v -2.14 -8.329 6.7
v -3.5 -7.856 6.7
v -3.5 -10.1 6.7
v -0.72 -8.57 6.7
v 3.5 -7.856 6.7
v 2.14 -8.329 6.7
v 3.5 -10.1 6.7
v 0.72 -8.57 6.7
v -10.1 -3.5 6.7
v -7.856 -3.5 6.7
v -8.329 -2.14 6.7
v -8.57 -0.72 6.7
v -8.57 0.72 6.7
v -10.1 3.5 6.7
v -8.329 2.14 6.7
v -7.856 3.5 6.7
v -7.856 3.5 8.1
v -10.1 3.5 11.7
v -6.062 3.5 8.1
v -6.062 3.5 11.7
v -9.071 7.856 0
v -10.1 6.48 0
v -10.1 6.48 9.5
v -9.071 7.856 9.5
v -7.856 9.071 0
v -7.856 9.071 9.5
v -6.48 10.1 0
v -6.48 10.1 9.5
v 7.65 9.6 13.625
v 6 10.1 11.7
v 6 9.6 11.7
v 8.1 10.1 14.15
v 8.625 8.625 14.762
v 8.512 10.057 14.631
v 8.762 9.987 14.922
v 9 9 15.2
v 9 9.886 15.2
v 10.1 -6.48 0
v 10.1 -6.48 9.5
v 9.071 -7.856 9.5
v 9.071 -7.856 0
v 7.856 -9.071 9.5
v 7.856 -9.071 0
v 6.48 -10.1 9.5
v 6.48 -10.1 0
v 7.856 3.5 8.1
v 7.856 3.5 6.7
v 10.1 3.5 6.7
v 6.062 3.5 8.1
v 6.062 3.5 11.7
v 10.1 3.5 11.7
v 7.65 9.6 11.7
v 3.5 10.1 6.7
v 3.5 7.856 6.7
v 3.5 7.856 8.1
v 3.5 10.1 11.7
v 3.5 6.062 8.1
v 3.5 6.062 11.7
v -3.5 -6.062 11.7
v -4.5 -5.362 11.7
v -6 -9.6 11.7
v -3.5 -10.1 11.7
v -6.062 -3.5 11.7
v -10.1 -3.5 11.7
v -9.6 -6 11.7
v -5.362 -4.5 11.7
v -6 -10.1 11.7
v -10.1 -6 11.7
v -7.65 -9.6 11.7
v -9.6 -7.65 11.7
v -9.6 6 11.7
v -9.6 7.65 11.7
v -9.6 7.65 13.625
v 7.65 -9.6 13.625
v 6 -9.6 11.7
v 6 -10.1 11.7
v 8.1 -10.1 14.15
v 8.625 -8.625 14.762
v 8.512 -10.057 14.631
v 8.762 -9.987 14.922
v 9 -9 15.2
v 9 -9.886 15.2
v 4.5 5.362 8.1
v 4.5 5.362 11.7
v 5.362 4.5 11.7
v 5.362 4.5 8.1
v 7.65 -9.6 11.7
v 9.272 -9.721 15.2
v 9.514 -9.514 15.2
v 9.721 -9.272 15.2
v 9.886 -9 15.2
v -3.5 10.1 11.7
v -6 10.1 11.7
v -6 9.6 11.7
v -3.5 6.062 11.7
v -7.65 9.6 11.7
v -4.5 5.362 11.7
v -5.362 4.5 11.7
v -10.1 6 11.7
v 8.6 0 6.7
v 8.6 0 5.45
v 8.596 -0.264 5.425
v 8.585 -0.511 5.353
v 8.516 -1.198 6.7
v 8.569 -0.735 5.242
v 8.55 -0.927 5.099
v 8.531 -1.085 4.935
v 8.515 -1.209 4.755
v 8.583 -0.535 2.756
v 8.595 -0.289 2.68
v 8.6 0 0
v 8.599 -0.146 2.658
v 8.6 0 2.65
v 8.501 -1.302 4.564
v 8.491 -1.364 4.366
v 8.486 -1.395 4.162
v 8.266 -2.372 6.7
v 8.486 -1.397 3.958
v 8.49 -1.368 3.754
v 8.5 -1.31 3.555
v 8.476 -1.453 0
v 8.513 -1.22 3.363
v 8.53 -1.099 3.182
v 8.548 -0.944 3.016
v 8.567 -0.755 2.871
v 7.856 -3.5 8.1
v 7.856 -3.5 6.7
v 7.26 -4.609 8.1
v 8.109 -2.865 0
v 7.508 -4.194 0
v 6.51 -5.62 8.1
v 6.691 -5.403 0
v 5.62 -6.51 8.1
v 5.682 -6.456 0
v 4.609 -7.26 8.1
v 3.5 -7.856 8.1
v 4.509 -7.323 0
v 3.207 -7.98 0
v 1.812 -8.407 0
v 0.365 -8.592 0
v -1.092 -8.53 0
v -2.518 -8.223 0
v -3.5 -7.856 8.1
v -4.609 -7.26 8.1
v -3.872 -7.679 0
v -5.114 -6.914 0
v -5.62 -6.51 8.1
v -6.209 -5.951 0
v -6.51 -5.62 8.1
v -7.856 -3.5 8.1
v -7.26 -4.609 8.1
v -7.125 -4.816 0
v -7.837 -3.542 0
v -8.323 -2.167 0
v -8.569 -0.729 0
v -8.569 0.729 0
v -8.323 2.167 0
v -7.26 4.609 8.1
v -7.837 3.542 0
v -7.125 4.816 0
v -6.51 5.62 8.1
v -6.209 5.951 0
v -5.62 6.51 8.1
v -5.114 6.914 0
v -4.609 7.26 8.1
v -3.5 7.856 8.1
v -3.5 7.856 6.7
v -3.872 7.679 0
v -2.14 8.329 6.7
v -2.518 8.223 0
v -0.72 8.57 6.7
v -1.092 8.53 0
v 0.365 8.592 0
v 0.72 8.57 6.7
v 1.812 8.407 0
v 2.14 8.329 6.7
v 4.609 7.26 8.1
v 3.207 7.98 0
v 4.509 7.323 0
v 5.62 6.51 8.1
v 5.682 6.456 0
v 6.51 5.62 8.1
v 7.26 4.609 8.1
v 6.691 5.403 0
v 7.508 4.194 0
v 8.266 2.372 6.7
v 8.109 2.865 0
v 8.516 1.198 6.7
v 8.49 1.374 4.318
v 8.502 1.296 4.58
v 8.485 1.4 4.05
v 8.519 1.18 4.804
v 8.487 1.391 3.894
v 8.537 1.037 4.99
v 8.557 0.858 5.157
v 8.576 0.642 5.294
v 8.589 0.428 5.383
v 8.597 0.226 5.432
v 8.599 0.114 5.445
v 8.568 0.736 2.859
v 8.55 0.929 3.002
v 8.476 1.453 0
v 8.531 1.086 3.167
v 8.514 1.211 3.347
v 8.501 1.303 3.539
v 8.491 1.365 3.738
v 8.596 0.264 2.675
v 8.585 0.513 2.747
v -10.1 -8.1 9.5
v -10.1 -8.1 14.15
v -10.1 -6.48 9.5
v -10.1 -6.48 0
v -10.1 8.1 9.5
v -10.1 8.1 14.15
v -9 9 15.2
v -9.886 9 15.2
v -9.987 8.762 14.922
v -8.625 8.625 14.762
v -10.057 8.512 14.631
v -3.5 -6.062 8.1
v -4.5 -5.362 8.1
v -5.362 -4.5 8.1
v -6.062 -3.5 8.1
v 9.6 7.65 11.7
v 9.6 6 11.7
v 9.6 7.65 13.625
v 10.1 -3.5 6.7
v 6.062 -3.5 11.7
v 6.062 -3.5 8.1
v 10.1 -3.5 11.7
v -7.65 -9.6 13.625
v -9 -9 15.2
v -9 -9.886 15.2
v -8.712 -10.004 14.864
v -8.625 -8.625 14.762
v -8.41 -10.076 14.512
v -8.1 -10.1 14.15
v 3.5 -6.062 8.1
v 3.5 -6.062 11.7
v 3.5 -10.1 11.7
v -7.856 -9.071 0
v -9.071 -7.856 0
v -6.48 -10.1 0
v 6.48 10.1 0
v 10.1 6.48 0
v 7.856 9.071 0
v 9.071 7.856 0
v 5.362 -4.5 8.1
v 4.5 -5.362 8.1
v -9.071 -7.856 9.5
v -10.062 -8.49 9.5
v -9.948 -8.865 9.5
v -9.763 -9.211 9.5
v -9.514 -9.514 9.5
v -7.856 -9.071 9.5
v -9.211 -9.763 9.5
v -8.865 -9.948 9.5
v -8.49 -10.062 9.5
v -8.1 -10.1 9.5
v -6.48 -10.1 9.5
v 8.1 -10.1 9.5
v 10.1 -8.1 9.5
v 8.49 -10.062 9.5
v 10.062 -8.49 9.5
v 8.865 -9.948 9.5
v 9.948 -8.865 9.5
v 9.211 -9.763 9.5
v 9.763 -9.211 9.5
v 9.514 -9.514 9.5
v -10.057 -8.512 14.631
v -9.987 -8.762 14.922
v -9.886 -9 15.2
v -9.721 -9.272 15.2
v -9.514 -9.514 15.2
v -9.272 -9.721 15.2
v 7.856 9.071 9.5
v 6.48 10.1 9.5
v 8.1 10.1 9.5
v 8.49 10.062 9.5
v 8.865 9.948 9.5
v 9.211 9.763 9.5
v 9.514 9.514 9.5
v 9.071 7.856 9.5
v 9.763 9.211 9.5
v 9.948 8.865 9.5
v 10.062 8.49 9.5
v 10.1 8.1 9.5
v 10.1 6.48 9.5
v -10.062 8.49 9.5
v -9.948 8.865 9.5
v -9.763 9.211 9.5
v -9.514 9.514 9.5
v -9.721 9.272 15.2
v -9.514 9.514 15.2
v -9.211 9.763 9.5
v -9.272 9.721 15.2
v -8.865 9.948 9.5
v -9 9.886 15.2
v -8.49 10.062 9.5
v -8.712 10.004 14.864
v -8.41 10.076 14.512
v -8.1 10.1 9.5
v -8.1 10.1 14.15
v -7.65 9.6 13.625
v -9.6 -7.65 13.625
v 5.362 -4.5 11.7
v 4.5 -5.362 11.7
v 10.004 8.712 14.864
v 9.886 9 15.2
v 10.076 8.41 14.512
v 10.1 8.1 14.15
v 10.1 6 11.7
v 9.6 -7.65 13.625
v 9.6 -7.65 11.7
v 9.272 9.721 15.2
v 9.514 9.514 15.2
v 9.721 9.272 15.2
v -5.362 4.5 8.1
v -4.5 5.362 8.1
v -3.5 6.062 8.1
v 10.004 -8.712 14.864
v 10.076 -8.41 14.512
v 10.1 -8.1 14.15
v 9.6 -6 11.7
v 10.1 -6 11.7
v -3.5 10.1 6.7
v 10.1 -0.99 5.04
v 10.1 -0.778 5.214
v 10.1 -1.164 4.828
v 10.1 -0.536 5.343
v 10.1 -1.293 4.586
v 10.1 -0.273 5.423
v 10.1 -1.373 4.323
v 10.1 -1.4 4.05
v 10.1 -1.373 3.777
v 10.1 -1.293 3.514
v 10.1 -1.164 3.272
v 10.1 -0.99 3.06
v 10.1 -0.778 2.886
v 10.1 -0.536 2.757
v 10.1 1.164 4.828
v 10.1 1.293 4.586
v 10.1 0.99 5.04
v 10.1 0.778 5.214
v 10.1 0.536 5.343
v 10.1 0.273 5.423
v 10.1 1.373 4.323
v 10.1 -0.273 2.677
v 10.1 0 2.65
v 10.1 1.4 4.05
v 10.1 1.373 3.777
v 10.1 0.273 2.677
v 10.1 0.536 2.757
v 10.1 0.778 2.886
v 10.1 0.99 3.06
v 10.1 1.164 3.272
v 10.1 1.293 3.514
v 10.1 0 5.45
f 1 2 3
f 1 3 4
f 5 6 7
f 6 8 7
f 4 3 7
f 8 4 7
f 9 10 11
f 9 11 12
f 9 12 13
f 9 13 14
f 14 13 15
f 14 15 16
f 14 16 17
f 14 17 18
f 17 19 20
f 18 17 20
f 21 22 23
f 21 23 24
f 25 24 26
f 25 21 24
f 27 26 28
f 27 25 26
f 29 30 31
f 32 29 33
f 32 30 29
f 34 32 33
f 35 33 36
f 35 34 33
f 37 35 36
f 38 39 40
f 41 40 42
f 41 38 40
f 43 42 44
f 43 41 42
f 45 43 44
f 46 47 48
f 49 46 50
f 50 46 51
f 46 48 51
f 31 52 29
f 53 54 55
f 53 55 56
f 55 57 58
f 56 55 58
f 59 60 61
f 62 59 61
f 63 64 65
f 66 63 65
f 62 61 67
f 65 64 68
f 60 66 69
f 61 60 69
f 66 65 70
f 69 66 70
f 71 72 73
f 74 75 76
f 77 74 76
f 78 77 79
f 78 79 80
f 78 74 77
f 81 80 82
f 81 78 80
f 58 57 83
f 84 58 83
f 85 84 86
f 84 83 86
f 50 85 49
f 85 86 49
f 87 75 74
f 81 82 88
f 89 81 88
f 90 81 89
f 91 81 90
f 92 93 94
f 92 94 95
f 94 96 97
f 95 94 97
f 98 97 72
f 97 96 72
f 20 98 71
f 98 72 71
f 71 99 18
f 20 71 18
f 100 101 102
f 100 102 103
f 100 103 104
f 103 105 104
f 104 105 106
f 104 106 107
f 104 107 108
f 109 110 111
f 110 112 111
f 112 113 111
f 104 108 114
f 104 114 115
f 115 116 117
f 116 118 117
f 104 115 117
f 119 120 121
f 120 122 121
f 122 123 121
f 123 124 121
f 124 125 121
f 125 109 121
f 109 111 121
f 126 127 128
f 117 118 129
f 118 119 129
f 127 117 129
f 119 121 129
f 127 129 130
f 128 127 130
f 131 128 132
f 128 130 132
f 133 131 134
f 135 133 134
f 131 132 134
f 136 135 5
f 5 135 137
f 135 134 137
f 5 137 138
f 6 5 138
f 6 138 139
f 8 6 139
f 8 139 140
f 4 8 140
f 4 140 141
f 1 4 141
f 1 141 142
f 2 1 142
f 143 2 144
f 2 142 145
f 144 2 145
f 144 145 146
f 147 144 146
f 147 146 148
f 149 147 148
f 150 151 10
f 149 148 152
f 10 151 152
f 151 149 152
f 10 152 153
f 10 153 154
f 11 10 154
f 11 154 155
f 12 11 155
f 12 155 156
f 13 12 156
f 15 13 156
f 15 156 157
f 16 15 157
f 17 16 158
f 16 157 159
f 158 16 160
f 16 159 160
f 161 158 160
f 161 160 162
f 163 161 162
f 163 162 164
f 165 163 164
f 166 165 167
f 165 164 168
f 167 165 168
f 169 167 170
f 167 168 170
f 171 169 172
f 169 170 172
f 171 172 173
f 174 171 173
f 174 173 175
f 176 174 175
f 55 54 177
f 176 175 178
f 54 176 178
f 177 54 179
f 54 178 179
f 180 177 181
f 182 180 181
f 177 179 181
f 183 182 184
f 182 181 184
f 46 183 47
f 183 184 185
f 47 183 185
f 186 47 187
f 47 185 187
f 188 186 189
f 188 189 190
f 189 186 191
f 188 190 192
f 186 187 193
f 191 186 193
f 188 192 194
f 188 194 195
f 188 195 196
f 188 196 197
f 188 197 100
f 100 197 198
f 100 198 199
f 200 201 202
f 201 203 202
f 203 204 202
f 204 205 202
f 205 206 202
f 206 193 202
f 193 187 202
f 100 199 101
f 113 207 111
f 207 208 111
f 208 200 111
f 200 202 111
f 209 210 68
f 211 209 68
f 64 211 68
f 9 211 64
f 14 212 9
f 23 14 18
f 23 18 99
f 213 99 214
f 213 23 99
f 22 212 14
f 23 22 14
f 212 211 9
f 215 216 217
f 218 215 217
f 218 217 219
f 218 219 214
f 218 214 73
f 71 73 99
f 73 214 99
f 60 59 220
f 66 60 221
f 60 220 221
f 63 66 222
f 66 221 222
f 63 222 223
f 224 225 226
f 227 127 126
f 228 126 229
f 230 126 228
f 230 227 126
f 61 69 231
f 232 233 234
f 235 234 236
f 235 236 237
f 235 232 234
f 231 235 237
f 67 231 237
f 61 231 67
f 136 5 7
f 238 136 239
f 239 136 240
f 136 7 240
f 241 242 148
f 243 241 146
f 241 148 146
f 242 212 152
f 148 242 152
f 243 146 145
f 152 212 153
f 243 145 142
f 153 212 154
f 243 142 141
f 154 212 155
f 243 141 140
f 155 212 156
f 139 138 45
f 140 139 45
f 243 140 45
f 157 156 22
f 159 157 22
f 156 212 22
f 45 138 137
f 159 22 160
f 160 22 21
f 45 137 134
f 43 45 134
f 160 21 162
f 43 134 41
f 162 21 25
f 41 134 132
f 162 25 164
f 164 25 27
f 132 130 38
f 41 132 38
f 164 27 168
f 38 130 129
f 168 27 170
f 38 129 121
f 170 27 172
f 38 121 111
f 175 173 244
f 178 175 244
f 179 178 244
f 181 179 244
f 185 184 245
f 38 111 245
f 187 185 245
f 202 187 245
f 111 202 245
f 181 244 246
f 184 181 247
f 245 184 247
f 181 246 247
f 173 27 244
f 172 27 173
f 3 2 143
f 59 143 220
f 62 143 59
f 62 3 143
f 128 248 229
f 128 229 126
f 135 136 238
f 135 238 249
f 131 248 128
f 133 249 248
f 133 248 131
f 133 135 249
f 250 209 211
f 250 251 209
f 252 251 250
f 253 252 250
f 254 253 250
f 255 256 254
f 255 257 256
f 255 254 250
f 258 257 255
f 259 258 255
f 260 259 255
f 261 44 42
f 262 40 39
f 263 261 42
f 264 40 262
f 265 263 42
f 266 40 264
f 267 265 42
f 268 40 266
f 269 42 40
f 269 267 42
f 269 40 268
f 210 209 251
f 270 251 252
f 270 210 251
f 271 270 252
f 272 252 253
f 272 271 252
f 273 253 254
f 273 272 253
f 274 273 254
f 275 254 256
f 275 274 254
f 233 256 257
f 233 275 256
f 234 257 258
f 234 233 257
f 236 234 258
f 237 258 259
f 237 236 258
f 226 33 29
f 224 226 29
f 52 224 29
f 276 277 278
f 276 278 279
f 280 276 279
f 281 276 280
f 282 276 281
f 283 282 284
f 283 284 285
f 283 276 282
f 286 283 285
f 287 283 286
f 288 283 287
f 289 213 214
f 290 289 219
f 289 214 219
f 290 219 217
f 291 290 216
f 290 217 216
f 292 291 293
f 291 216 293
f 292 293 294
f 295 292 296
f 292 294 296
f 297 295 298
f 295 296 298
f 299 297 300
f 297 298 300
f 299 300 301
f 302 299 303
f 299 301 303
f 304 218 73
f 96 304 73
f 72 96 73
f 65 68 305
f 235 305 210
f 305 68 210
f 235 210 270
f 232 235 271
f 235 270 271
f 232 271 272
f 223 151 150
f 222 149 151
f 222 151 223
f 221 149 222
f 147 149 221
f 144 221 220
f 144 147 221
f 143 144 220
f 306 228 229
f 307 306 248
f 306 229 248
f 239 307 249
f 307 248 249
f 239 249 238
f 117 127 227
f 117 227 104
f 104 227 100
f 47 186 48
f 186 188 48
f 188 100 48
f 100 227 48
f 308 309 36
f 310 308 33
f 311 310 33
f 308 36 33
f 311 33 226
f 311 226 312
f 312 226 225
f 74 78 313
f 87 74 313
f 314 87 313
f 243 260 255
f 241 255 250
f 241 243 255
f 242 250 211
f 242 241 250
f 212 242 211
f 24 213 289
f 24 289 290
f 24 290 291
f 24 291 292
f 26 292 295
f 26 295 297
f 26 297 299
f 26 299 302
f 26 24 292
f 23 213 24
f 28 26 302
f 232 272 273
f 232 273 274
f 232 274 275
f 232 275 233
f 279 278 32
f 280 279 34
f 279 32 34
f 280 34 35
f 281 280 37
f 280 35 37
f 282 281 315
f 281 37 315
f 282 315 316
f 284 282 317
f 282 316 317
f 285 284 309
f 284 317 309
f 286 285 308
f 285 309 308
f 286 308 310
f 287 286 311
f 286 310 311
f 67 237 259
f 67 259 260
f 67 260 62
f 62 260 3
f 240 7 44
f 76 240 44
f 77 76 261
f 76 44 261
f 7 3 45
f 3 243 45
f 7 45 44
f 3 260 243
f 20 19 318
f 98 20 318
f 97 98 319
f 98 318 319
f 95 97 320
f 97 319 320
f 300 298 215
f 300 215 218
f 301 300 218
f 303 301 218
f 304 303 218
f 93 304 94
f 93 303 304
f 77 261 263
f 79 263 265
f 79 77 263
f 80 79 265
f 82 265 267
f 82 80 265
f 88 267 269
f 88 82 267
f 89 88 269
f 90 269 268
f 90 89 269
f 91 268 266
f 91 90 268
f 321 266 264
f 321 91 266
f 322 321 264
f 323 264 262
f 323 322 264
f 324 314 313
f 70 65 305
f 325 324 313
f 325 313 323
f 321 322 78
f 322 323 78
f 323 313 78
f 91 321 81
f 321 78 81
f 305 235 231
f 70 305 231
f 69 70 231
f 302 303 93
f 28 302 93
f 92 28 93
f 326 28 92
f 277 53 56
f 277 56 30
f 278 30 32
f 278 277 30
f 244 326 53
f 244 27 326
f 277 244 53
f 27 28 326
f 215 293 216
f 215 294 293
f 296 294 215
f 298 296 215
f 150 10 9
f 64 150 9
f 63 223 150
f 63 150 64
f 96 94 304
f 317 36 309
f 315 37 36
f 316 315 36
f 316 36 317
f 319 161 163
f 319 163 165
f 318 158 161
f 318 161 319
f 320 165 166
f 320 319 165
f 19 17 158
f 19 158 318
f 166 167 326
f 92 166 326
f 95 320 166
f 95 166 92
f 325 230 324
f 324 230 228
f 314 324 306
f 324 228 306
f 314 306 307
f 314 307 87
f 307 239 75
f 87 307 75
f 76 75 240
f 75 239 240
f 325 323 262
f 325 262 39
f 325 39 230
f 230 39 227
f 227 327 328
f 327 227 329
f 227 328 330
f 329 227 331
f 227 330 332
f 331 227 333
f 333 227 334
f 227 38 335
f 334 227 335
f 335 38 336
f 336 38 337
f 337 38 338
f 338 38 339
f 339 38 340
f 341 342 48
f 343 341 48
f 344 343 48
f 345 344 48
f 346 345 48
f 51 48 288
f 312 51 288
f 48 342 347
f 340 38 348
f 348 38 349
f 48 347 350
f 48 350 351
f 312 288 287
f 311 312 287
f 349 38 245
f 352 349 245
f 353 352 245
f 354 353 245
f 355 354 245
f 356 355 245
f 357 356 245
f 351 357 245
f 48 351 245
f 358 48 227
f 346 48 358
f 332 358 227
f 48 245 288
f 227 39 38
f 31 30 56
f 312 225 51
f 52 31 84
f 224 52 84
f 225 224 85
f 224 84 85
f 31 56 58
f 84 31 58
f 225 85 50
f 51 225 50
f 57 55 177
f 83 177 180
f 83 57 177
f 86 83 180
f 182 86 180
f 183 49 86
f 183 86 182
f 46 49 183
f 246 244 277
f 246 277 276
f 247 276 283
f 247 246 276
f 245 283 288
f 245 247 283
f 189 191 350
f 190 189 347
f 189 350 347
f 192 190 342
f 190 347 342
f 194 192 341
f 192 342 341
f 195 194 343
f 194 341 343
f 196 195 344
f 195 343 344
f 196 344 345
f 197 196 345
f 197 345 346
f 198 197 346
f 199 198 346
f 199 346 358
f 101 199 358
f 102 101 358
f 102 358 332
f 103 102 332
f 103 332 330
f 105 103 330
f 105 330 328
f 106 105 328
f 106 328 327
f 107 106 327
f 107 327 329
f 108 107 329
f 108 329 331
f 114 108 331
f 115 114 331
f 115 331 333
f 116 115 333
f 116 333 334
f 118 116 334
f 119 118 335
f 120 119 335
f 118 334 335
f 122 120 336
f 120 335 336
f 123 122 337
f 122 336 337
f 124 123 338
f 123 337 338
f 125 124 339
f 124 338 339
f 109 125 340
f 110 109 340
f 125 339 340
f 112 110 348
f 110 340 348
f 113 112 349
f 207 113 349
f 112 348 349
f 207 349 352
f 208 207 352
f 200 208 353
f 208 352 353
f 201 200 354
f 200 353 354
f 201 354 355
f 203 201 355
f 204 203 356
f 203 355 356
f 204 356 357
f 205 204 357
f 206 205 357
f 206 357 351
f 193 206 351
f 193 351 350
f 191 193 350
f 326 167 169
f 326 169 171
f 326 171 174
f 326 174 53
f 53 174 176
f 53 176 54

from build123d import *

# Parameters (mm, degrees)
SKETCH_W        = 20.2
SKETCH_H        = 20.2
PAD_DEPTH       = 15.2
POCKET_DEPTH    = 3.5
POCKET001_DEPTH = 20.201
POCKET002_DEPTH = 20.201
SKETCH008_R     = 8.6
POCKET003_DEPTH = 8.1
SKETCH009_W     = 7
SKETCH009_H     = 5
POCKET004_DEPTH = 20.201
SKETCH010_W     = 7
SKETCH010_H     = 5
POCKET005_DEPTH = 20.201
SKETCH011_R     = 20
SKETCH011_R_2   = 12
POCKET006_DEPTH = 9.5
SKETCH012_R     = 7
POCKET007_DEPTH = 7.101
SKETCH013_R     = 1.4
POCKET008_DEPTH = 3
FILLET_R        = 2


with BuildPart() as part:
    # Sketch → Pad (new body)
    with BuildSketch(Plane.XY):
        Rectangle(SKETCH_W, SKETCH_H)
    extrude(amount=PAD_DEPTH)

    # Sketch004 → Pocket (cut)
    with BuildSketch(Plane.XY.offset(15.2)):
        Polygon((9.6, 7.65), (7.65, 9.6), (-7.65, 9.6), (-9.6, 7.65), (-9.6, -7.65), (-7.65, -9.6), (7.65, -9.6), (9.6, -7.65), align=None)
    extrude(amount=-POCKET_DEPTH, mode=Mode.SUBTRACT)

    # Sketch006 → Pocket001 (cut, through all)
    with BuildSketch(Plane(origin=(-10.1, 0, 0), x_dir=(0, -1, 0), z_dir=(-1, 0, 0))):
        Polygon((-9, 15.2), (-6, 11.7), (6, 11.7), (9, 15.2), align=None)
    extrude(amount=-POCKET001_DEPTH, mode=Mode.SUBTRACT)

    # Sketch007 → Pocket002 (cut, through all)
    with BuildSketch(Plane(origin=(0, 10.1, 0), x_dir=(-1, 0, 0), z_dir=(0, 1, 0))):
        Polygon((-9, 15.2), (9, 15.2), (6, 11.7), (-6, 11.7), align=None)
    extrude(amount=-POCKET002_DEPTH, mode=Mode.SUBTRACT)

    # Sketch008 → Pocket003 (cut)
    with BuildSketch(Plane(origin=(0, 0, 0), x_dir=(1, 0, 0), z_dir=(0, 0, -1))):
        Circle(SKETCH008_R)
    extrude(amount=-POCKET003_DEPTH, mode=Mode.SUBTRACT)

    # Sketch009 → Pocket004 (cut, through all)
    with BuildSketch(Plane.YZ.offset(10.1)):
        with Locations((0, 9.2)):
            Rectangle(SKETCH009_W, SKETCH009_H)
    extrude(amount=-POCKET004_DEPTH, mode=Mode.SUBTRACT)

    # Sketch010 → Pocket005 (cut, through all)
    with BuildSketch(Plane.XZ.offset(10.1)):
        with Locations((0, 9.2)):
            Rectangle(SKETCH010_W, SKETCH010_H)
    extrude(amount=-POCKET005_DEPTH, mode=Mode.SUBTRACT)

    # Sketch011 → Pocket006 (cut)
    with BuildSketch(Plane(origin=(0, 0, 0), x_dir=(1, 0, 0), z_dir=(0, 0, -1))):
        Circle(SKETCH011_R)
        Circle(SKETCH011_R_2, mode=Mode.SUBTRACT)
    extrude(amount=-POCKET006_DEPTH, mode=Mode.SUBTRACT)

    # Sketch012 → Pocket007 (cut, through all)
    with BuildSketch(Plane(origin=(0, 0, 8.1), x_dir=(1, 0, 0), z_dir=(0, 0, -1))):
        Circle(SKETCH012_R)
    extrude(amount=-POCKET007_DEPTH, mode=Mode.SUBTRACT)

    # Sketch013 → Pocket008 (cut)
    with BuildSketch(Plane.YZ.offset(10.1)):
        with Locations((0, 4.05)):
            Circle(SKETCH013_R)
    extrude(amount=-POCKET008_DEPTH, mode=Mode.SUBTRACT)

    # Fillet
    fillet_edges = [part.edges().sort_by_distance(p)[0] for p in [
        (10.1, 10.1, 12.35),
        (-10.1, 10.1, 12.35),
        (10.1, -10.1, 12.35),
        (-10.1, -10.1, 12.35),
    ]]
    fillet(fillet_edges, radius=FILLET_R)


solid = part.part
